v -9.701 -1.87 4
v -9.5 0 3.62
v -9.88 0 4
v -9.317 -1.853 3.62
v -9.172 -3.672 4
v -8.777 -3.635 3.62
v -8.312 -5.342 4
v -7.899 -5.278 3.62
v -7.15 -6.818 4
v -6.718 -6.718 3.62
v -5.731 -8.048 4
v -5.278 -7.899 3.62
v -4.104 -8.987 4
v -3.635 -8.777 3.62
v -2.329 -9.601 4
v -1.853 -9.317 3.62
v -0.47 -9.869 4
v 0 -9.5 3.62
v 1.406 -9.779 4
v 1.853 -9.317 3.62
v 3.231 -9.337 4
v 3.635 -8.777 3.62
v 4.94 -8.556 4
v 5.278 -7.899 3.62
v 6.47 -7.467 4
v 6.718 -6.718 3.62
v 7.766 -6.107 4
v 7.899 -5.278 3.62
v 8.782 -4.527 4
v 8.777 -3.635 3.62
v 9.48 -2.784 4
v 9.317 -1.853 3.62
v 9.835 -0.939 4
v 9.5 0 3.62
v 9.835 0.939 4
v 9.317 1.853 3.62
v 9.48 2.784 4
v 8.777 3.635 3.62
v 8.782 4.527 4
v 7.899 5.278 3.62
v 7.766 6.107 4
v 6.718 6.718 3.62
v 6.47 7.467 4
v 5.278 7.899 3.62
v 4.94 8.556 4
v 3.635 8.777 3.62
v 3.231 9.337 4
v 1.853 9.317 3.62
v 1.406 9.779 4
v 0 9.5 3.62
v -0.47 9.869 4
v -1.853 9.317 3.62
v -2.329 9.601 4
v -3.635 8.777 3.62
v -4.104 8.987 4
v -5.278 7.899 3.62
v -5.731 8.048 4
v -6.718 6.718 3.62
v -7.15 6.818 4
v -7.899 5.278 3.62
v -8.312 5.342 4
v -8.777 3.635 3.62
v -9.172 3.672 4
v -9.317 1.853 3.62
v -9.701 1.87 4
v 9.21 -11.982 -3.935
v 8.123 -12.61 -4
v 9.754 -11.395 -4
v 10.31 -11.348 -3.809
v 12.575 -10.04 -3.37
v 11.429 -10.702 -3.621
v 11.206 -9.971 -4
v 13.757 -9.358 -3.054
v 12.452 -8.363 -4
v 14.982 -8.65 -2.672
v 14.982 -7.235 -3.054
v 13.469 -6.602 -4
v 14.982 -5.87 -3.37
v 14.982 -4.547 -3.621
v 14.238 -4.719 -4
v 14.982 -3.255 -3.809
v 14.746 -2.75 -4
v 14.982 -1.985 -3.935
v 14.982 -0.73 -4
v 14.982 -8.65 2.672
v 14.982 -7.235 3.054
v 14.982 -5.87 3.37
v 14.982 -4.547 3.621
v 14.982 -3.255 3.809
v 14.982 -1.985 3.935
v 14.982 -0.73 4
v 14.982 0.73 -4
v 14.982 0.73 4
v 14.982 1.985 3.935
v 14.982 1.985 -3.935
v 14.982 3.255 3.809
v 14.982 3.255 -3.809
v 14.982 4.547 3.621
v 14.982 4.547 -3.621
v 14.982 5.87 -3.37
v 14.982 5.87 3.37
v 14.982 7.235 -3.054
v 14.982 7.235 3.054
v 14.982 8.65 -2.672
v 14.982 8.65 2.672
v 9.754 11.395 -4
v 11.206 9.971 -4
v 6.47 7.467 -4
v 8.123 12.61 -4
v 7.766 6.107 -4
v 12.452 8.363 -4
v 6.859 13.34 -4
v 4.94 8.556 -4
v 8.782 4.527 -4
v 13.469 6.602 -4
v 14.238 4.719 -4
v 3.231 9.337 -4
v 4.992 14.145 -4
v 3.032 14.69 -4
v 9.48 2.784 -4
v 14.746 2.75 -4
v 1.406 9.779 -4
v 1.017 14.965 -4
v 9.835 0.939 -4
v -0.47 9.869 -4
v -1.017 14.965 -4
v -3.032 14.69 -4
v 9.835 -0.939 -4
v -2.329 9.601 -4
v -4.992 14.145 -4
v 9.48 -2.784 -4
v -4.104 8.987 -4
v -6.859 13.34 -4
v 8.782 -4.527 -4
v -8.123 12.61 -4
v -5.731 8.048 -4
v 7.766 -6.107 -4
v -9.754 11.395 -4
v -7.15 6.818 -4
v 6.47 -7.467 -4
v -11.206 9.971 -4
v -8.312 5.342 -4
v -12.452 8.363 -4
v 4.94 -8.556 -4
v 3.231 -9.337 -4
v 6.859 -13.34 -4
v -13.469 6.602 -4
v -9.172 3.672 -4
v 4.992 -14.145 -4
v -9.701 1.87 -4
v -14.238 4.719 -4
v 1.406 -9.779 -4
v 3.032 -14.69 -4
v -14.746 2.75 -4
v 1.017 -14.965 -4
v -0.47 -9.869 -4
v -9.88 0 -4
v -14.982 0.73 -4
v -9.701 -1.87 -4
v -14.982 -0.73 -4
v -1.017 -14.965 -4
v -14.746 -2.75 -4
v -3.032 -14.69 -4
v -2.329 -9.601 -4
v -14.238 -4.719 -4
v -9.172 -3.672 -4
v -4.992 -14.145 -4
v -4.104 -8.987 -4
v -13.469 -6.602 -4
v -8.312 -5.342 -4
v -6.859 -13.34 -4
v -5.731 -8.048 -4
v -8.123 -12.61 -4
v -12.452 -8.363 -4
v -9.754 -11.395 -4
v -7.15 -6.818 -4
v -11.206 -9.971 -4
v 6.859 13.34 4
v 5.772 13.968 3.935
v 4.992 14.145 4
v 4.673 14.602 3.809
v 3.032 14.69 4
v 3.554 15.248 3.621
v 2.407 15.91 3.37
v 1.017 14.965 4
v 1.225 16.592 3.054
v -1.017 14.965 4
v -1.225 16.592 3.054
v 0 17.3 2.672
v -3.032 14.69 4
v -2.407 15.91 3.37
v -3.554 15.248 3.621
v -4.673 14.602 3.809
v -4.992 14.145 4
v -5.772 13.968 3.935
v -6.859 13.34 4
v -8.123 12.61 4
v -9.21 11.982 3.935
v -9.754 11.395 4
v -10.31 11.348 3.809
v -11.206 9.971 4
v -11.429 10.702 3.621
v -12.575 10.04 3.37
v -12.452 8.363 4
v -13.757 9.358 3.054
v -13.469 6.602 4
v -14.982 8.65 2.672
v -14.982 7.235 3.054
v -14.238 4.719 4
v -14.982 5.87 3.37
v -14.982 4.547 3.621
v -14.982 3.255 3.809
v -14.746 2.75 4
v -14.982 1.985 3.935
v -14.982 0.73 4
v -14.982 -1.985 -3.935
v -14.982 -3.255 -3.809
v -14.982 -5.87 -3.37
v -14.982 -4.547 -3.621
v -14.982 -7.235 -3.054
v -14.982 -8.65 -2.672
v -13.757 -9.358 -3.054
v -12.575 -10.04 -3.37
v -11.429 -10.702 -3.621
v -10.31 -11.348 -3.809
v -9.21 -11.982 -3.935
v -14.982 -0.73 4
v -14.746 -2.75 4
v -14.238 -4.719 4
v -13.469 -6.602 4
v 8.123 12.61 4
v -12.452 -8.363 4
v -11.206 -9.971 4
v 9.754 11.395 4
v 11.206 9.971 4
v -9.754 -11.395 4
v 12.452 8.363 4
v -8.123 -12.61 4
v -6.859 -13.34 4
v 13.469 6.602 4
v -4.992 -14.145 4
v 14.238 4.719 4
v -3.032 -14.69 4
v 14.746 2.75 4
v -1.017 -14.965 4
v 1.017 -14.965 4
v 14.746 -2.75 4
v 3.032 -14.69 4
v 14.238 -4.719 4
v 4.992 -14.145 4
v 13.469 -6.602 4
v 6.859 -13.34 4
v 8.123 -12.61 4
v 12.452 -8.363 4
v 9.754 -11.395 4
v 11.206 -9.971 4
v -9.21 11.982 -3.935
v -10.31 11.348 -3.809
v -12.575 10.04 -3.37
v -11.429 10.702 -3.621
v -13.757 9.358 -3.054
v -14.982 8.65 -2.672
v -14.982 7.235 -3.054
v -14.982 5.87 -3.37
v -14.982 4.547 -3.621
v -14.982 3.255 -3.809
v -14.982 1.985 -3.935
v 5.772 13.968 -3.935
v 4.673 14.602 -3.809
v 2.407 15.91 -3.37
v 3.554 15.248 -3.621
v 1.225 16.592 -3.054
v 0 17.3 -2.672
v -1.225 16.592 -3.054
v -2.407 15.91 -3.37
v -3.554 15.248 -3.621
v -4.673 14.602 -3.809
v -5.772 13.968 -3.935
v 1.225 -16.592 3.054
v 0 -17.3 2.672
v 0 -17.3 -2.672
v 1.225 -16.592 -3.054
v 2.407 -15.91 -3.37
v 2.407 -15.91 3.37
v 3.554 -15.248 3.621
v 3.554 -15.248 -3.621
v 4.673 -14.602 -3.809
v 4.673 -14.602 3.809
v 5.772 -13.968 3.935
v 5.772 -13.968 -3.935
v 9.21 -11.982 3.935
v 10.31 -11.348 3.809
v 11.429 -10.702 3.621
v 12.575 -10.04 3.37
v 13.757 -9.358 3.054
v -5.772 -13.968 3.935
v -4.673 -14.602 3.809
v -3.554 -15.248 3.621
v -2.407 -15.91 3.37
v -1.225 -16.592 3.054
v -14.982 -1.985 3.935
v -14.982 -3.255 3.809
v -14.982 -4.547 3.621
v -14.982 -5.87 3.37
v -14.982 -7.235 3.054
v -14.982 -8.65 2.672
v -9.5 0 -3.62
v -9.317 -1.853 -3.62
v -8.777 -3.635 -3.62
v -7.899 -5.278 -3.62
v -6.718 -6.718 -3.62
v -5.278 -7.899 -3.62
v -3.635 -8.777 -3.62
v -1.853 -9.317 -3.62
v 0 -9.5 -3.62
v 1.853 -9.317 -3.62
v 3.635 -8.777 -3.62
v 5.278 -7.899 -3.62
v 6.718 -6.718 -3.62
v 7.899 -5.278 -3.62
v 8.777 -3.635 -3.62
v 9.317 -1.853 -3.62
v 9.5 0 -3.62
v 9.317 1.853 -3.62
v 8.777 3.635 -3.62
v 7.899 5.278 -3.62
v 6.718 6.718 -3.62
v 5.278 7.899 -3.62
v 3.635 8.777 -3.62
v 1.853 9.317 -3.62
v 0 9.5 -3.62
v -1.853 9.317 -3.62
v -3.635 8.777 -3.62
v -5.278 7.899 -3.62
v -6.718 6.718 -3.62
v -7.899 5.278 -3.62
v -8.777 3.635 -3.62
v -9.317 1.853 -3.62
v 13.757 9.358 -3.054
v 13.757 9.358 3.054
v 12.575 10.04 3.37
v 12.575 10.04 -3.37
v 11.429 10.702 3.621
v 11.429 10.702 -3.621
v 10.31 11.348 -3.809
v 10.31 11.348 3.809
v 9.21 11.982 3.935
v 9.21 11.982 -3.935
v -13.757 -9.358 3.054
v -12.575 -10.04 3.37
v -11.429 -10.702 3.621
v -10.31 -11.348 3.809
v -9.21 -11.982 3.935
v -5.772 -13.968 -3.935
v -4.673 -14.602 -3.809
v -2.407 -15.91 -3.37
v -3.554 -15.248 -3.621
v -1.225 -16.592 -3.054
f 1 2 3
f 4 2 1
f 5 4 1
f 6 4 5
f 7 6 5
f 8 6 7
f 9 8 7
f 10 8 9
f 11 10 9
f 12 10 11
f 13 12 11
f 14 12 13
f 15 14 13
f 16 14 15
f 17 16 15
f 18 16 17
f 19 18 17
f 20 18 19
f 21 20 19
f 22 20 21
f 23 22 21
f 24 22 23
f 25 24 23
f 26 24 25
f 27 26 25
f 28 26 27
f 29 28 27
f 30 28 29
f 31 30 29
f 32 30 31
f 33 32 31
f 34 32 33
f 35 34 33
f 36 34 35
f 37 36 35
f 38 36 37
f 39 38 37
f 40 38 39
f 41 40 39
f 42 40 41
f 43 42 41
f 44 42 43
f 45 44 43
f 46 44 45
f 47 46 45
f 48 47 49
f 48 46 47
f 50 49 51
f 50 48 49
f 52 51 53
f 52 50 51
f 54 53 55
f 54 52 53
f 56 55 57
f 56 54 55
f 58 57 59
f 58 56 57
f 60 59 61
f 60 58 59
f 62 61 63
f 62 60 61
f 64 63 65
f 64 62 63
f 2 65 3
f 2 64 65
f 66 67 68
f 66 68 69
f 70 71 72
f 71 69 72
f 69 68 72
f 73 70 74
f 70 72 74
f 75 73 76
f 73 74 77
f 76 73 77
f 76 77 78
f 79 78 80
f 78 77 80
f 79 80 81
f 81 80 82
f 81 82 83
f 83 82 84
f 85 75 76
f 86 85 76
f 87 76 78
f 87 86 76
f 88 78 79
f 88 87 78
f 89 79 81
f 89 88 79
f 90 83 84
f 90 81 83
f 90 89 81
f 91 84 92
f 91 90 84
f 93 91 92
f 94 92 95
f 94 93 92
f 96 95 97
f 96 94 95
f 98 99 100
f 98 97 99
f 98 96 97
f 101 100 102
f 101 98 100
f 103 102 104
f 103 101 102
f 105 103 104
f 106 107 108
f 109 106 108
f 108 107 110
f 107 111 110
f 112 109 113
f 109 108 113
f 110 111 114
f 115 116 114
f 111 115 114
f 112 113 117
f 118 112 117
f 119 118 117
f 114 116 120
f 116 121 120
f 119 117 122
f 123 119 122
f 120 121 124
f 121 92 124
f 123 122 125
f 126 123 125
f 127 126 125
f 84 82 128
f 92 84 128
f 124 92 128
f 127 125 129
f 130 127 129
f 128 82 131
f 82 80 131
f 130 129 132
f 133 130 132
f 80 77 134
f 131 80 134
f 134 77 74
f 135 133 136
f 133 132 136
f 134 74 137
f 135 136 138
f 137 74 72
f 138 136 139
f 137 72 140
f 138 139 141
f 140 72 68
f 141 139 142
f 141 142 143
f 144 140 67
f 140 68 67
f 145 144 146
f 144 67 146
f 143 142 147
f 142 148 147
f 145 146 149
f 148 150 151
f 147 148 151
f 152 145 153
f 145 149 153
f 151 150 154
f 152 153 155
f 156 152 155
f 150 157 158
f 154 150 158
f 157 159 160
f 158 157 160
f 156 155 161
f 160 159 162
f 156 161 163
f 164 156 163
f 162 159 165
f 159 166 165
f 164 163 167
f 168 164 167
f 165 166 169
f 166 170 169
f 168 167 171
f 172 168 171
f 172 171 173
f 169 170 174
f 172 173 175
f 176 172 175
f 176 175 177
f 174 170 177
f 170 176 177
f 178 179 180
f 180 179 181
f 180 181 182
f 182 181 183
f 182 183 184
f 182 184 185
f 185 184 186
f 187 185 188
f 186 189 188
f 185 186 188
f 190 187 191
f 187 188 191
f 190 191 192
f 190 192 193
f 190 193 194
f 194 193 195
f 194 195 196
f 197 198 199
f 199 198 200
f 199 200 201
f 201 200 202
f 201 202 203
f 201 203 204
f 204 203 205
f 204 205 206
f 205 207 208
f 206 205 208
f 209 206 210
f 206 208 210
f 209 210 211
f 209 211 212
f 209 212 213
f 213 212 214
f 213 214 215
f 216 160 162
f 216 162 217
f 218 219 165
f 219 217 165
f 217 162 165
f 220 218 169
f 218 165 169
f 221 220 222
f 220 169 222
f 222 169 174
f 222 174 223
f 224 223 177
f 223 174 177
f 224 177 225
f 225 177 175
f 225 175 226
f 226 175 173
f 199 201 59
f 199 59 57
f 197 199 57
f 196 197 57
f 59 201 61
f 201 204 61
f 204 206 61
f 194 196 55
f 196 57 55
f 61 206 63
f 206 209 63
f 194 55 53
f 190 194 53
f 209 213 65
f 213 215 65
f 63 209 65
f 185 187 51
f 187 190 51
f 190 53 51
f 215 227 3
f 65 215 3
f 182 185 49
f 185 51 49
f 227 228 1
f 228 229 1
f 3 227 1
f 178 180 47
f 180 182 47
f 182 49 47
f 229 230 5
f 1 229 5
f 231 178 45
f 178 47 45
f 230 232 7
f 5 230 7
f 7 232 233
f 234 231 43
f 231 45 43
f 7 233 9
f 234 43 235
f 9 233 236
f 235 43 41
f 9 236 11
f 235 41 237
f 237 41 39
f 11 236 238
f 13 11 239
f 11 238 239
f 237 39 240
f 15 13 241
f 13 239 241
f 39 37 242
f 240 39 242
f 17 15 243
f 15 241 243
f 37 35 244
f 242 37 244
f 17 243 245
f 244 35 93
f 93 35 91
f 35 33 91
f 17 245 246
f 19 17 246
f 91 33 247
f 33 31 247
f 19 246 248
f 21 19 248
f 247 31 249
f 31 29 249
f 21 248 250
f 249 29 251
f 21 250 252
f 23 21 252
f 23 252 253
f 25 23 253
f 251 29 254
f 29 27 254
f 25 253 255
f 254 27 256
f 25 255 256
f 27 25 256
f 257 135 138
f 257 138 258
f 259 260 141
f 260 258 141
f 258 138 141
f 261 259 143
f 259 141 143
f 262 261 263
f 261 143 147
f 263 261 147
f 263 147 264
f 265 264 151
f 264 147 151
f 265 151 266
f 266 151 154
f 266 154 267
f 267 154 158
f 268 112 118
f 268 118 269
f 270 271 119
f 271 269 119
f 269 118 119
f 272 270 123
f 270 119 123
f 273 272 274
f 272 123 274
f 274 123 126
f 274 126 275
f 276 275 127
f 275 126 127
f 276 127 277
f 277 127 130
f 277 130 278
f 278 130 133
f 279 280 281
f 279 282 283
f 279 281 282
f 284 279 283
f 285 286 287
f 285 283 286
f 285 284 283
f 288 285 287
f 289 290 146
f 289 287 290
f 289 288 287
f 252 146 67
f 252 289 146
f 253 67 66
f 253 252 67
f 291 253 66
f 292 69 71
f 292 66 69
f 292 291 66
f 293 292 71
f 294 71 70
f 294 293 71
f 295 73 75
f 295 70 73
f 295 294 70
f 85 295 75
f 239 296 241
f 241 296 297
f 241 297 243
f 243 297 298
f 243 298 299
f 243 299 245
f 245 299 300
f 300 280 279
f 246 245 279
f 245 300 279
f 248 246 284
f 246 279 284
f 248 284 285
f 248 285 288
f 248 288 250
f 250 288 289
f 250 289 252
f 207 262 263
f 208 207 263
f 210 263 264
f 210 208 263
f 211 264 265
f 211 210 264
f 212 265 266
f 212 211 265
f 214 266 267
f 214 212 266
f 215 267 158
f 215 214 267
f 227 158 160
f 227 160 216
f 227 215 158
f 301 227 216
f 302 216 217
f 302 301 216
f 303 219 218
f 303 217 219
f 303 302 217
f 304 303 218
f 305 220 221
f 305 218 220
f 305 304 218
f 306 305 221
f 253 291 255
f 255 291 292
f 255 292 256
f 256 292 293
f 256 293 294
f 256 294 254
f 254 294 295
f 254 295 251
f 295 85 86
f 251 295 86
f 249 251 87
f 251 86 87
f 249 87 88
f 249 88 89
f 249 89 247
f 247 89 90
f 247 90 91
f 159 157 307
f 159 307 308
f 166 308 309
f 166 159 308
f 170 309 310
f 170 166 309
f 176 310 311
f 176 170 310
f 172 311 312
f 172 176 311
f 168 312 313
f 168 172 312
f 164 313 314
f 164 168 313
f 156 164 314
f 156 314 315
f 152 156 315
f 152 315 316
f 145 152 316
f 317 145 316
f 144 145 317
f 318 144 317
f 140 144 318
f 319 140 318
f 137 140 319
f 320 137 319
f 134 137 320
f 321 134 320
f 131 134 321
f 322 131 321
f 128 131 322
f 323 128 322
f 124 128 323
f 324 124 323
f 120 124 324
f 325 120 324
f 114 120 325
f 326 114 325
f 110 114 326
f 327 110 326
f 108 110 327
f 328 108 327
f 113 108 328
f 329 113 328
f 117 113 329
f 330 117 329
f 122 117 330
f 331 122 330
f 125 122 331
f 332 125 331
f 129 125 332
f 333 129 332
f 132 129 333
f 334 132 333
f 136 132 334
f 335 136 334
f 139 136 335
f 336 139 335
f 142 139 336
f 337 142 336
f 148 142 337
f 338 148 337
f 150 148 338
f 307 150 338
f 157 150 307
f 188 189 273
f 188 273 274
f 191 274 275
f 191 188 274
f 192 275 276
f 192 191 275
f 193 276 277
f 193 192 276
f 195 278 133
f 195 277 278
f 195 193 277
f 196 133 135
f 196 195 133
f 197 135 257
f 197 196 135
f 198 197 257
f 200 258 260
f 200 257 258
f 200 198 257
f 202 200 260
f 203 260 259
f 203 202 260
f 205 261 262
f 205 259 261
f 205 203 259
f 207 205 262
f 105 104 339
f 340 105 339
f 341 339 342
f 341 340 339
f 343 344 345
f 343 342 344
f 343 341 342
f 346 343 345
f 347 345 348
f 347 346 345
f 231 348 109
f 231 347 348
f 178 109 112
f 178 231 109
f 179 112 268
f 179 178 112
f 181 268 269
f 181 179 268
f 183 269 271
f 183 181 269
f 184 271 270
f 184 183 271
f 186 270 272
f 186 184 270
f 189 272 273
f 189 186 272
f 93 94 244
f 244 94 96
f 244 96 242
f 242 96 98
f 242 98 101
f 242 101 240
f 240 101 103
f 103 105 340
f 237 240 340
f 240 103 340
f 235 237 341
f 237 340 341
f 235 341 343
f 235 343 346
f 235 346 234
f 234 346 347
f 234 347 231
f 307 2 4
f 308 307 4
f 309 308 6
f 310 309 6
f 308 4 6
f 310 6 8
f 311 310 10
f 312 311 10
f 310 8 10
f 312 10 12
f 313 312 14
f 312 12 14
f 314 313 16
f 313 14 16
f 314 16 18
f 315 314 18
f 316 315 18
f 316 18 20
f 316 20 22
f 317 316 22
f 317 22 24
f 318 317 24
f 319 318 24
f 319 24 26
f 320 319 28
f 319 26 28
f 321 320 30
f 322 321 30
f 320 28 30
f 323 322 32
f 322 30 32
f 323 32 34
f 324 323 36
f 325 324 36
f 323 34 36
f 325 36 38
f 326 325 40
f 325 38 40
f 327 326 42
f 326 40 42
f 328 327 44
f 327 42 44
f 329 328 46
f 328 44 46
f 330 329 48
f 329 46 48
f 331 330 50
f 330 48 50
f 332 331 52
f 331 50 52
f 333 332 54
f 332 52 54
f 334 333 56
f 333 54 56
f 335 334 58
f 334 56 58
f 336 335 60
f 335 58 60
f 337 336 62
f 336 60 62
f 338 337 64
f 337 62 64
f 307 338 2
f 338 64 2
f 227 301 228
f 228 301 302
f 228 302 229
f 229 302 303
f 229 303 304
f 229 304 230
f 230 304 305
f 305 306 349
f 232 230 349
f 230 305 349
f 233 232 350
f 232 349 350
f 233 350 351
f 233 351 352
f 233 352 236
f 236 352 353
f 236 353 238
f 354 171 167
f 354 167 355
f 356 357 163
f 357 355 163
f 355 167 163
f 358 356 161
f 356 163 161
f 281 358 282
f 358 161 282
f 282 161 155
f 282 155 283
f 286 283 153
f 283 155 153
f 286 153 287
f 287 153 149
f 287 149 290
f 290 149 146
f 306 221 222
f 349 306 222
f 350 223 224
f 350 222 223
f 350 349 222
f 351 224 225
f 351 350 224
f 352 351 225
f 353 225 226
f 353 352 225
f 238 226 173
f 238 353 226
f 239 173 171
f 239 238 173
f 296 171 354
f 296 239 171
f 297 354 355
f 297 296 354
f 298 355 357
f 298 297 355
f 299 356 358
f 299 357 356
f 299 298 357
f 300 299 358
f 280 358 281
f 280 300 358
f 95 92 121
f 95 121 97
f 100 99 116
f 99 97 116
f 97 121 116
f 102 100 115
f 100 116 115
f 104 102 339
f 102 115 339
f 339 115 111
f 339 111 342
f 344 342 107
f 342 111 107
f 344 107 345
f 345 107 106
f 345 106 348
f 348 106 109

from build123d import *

# Parameters (mm, degrees)
SKETCH3_OUTSIDE_W = 46.516
SKETCH3_OUTSIDE_H = 46.516
HEX_2_DEPTH       = 26.740629363
INNERCHAMFER_SIZE = 0.38


with BuildPart() as part:
    # Sketch2 → Body (revolve)
    with BuildSketch(Plane(origin=(0, 0, 0), x_dir=(0, 0, -1), z_dir=(1, 0, 0)), mode=Mode.PRIVATE) as body_sk:
        Polygon((-4, 9.5), (-4, 15), (-2.672094381, 17.3), (2.672094381, 17.3), (4, 15), (4, 9.5), align=None)
    revolve(body_sk.sketch.rotate(Axis((0, 0, 27.389186195), (0, 0, 1)), 90), axis=Axis((0, 0, 27.389186195), (0, 0, 1)))

    # Sketch3 outside → Hex 2 (cut, through all)
    with BuildSketch(Plane.XY.offset(4)):
        Rectangle(SKETCH3_OUTSIDE_W, SKETCH3_OUTSIDE_H)
        Polygon((14.982239485, -8.65), (14.982239485, 8.65), (0, 17.3), (-14.982239485, 8.65), (-14.982239485, -8.65), (0, -17.3), align=None, mode=Mode.SUBTRACT)
    extrude(amount=-HEX_2_DEPTH, mode=Mode.SUBTRACT)

    # InnerChamfer
    innerchamfer_edges = [part.edges().sort_by_distance(p)[0] for p in [
        (9.5, 0, 4),
        (9.5, 0, -4),
    ]]
    chamfer(innerchamfer_edges, length=INNERCHAMFER_SIZE)


solid = part.part
